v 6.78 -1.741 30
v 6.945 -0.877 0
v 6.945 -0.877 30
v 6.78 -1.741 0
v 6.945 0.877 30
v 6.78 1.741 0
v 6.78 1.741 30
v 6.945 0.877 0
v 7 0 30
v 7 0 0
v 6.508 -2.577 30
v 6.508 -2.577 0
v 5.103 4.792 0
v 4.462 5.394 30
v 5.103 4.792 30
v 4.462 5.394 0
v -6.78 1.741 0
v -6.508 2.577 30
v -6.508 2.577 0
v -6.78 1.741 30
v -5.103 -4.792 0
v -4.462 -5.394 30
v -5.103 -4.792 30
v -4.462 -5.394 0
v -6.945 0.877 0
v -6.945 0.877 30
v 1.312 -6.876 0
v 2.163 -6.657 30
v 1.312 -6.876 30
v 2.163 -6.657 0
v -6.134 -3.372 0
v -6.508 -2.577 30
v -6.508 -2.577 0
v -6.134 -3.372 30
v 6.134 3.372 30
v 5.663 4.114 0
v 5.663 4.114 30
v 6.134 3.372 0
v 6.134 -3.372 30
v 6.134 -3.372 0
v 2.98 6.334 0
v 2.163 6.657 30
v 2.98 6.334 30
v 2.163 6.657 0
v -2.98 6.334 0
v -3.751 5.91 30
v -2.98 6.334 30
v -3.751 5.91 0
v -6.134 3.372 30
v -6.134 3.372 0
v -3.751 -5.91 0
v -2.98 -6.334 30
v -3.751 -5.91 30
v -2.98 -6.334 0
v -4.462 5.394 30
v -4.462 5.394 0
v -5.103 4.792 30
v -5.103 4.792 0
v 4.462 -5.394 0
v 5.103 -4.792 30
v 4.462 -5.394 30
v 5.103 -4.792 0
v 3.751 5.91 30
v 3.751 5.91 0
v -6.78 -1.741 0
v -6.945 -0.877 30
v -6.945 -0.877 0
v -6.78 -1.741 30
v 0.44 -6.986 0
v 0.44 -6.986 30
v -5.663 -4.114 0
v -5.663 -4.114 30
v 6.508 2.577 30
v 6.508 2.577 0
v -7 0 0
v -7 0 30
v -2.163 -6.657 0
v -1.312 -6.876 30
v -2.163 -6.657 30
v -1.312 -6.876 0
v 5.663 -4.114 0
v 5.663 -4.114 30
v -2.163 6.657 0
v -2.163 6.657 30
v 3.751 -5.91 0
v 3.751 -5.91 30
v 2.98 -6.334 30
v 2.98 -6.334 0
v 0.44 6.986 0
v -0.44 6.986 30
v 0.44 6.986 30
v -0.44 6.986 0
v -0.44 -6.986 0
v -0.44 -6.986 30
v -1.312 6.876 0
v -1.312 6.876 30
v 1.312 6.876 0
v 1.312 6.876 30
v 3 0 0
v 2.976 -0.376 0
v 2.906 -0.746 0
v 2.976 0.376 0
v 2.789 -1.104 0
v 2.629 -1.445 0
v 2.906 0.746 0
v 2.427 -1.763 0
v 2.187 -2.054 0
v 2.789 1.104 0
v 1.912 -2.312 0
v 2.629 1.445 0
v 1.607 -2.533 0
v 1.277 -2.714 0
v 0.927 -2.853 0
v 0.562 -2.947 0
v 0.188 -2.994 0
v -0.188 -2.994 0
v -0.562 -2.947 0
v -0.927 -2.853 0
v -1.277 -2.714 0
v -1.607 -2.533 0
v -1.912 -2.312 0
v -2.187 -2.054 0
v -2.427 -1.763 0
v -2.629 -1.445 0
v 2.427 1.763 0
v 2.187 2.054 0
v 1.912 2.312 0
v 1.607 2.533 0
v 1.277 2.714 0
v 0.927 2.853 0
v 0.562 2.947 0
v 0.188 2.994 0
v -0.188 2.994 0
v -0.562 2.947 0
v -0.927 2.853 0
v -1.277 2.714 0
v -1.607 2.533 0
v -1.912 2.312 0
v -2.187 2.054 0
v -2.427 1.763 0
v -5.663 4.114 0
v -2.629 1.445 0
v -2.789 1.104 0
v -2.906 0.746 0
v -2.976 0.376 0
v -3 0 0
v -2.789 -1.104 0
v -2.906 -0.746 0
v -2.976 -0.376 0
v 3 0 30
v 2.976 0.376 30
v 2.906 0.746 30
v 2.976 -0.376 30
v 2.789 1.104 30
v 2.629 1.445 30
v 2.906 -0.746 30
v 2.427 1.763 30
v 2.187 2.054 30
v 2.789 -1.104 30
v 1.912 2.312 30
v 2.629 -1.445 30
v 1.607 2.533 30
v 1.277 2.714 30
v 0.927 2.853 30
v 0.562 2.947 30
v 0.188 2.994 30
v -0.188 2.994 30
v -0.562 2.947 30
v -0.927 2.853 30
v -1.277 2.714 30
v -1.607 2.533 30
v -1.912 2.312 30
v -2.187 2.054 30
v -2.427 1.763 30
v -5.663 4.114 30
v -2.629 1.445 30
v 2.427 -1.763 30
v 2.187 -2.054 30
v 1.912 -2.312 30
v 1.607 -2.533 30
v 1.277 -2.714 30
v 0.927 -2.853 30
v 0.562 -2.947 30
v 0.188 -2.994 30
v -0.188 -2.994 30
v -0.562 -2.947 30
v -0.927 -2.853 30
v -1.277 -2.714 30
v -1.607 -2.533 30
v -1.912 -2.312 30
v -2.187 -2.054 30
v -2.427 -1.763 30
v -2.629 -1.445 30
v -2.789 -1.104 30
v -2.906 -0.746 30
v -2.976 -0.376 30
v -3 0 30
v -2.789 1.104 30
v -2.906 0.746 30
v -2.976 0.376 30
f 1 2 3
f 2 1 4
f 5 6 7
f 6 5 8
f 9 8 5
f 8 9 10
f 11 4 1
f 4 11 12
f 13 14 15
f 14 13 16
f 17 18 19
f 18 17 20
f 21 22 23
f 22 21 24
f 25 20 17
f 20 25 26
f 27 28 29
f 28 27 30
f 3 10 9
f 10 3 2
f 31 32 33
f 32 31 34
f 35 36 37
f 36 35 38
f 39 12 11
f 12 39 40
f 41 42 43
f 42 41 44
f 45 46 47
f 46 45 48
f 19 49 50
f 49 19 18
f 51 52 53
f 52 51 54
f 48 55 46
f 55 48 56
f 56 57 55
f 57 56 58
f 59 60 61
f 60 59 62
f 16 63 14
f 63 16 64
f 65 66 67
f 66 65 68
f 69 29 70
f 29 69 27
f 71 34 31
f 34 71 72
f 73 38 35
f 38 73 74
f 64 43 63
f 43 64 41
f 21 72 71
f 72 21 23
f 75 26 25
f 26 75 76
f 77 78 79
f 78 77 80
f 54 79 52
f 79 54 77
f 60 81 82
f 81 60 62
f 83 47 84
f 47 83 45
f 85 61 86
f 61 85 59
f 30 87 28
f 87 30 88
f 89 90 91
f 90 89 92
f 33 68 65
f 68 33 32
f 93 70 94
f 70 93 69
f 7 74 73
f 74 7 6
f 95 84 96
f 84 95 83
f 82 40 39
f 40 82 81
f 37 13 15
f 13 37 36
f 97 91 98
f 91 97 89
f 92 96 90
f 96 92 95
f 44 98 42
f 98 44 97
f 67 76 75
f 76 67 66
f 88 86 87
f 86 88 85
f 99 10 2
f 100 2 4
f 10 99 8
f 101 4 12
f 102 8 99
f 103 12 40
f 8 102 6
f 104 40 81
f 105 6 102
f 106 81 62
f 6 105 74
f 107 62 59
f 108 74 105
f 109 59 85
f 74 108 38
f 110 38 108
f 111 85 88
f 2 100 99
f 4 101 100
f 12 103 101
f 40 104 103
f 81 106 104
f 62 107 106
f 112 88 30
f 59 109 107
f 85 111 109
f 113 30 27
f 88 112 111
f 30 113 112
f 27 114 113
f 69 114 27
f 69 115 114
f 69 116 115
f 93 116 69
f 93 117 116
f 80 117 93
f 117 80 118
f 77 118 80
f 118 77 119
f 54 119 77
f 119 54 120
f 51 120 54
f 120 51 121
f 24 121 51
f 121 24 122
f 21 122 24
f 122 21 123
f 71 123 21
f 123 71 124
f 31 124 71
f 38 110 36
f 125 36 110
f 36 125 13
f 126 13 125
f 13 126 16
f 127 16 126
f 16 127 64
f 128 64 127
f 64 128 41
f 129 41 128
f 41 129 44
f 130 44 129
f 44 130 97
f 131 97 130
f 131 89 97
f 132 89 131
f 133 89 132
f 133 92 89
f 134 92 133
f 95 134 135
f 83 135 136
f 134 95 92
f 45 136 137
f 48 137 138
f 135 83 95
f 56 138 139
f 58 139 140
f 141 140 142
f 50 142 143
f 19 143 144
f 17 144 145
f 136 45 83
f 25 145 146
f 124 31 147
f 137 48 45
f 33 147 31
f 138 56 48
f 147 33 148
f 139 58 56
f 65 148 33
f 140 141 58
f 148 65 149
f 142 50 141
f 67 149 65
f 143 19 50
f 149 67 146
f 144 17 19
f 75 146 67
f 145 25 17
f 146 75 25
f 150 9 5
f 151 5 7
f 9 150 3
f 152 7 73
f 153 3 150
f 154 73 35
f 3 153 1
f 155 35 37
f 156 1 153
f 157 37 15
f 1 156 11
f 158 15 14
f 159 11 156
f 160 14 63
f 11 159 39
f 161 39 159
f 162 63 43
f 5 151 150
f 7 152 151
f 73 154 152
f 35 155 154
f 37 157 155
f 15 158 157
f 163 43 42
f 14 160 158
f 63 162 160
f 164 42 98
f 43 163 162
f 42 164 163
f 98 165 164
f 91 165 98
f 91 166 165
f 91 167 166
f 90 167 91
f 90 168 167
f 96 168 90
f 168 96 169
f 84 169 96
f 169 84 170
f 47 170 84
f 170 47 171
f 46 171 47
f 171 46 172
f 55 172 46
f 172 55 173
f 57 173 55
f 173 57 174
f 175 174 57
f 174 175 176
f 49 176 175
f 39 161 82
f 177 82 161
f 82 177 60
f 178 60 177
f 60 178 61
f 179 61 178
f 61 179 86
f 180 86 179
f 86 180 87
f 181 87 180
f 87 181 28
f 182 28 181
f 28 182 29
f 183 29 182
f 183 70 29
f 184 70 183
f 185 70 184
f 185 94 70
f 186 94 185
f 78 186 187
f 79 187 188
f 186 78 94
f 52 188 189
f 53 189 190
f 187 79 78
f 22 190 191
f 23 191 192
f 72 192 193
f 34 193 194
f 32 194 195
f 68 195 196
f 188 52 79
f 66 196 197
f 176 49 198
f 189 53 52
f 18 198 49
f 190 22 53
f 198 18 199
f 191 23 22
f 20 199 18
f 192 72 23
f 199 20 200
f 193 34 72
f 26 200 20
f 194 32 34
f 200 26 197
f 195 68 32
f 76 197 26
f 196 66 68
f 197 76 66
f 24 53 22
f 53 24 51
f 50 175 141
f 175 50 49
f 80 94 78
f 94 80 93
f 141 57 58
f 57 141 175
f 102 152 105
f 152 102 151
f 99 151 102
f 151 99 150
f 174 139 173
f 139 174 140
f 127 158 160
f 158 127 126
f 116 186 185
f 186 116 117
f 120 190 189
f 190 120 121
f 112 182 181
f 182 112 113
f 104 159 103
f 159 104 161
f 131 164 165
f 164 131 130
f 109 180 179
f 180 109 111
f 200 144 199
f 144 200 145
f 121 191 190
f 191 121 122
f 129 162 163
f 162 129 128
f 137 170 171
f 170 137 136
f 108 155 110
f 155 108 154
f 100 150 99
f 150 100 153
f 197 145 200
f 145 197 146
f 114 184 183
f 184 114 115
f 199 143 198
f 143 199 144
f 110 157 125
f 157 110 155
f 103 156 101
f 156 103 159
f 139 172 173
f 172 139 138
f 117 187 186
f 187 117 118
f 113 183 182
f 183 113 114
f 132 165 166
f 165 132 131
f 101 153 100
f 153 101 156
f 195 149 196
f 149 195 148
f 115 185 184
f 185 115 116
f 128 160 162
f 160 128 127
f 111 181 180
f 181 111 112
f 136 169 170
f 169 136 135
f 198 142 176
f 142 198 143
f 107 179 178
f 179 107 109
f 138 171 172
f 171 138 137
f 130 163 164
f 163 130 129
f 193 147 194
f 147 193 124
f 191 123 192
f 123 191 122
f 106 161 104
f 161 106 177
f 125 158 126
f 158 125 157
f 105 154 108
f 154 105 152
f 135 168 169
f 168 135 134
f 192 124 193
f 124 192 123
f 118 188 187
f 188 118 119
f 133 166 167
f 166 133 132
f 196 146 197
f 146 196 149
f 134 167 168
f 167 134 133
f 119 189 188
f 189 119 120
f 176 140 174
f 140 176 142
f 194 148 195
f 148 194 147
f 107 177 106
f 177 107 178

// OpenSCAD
$fn = 50;


difference() {
	union() {
		cylinder(h = 30, r = 7.0000000000);
	}
	union() {
		translate(v = [0, 0, -100]) {
			cylinder(h = 200, r = 3.0000000000);
		}
	}
}
